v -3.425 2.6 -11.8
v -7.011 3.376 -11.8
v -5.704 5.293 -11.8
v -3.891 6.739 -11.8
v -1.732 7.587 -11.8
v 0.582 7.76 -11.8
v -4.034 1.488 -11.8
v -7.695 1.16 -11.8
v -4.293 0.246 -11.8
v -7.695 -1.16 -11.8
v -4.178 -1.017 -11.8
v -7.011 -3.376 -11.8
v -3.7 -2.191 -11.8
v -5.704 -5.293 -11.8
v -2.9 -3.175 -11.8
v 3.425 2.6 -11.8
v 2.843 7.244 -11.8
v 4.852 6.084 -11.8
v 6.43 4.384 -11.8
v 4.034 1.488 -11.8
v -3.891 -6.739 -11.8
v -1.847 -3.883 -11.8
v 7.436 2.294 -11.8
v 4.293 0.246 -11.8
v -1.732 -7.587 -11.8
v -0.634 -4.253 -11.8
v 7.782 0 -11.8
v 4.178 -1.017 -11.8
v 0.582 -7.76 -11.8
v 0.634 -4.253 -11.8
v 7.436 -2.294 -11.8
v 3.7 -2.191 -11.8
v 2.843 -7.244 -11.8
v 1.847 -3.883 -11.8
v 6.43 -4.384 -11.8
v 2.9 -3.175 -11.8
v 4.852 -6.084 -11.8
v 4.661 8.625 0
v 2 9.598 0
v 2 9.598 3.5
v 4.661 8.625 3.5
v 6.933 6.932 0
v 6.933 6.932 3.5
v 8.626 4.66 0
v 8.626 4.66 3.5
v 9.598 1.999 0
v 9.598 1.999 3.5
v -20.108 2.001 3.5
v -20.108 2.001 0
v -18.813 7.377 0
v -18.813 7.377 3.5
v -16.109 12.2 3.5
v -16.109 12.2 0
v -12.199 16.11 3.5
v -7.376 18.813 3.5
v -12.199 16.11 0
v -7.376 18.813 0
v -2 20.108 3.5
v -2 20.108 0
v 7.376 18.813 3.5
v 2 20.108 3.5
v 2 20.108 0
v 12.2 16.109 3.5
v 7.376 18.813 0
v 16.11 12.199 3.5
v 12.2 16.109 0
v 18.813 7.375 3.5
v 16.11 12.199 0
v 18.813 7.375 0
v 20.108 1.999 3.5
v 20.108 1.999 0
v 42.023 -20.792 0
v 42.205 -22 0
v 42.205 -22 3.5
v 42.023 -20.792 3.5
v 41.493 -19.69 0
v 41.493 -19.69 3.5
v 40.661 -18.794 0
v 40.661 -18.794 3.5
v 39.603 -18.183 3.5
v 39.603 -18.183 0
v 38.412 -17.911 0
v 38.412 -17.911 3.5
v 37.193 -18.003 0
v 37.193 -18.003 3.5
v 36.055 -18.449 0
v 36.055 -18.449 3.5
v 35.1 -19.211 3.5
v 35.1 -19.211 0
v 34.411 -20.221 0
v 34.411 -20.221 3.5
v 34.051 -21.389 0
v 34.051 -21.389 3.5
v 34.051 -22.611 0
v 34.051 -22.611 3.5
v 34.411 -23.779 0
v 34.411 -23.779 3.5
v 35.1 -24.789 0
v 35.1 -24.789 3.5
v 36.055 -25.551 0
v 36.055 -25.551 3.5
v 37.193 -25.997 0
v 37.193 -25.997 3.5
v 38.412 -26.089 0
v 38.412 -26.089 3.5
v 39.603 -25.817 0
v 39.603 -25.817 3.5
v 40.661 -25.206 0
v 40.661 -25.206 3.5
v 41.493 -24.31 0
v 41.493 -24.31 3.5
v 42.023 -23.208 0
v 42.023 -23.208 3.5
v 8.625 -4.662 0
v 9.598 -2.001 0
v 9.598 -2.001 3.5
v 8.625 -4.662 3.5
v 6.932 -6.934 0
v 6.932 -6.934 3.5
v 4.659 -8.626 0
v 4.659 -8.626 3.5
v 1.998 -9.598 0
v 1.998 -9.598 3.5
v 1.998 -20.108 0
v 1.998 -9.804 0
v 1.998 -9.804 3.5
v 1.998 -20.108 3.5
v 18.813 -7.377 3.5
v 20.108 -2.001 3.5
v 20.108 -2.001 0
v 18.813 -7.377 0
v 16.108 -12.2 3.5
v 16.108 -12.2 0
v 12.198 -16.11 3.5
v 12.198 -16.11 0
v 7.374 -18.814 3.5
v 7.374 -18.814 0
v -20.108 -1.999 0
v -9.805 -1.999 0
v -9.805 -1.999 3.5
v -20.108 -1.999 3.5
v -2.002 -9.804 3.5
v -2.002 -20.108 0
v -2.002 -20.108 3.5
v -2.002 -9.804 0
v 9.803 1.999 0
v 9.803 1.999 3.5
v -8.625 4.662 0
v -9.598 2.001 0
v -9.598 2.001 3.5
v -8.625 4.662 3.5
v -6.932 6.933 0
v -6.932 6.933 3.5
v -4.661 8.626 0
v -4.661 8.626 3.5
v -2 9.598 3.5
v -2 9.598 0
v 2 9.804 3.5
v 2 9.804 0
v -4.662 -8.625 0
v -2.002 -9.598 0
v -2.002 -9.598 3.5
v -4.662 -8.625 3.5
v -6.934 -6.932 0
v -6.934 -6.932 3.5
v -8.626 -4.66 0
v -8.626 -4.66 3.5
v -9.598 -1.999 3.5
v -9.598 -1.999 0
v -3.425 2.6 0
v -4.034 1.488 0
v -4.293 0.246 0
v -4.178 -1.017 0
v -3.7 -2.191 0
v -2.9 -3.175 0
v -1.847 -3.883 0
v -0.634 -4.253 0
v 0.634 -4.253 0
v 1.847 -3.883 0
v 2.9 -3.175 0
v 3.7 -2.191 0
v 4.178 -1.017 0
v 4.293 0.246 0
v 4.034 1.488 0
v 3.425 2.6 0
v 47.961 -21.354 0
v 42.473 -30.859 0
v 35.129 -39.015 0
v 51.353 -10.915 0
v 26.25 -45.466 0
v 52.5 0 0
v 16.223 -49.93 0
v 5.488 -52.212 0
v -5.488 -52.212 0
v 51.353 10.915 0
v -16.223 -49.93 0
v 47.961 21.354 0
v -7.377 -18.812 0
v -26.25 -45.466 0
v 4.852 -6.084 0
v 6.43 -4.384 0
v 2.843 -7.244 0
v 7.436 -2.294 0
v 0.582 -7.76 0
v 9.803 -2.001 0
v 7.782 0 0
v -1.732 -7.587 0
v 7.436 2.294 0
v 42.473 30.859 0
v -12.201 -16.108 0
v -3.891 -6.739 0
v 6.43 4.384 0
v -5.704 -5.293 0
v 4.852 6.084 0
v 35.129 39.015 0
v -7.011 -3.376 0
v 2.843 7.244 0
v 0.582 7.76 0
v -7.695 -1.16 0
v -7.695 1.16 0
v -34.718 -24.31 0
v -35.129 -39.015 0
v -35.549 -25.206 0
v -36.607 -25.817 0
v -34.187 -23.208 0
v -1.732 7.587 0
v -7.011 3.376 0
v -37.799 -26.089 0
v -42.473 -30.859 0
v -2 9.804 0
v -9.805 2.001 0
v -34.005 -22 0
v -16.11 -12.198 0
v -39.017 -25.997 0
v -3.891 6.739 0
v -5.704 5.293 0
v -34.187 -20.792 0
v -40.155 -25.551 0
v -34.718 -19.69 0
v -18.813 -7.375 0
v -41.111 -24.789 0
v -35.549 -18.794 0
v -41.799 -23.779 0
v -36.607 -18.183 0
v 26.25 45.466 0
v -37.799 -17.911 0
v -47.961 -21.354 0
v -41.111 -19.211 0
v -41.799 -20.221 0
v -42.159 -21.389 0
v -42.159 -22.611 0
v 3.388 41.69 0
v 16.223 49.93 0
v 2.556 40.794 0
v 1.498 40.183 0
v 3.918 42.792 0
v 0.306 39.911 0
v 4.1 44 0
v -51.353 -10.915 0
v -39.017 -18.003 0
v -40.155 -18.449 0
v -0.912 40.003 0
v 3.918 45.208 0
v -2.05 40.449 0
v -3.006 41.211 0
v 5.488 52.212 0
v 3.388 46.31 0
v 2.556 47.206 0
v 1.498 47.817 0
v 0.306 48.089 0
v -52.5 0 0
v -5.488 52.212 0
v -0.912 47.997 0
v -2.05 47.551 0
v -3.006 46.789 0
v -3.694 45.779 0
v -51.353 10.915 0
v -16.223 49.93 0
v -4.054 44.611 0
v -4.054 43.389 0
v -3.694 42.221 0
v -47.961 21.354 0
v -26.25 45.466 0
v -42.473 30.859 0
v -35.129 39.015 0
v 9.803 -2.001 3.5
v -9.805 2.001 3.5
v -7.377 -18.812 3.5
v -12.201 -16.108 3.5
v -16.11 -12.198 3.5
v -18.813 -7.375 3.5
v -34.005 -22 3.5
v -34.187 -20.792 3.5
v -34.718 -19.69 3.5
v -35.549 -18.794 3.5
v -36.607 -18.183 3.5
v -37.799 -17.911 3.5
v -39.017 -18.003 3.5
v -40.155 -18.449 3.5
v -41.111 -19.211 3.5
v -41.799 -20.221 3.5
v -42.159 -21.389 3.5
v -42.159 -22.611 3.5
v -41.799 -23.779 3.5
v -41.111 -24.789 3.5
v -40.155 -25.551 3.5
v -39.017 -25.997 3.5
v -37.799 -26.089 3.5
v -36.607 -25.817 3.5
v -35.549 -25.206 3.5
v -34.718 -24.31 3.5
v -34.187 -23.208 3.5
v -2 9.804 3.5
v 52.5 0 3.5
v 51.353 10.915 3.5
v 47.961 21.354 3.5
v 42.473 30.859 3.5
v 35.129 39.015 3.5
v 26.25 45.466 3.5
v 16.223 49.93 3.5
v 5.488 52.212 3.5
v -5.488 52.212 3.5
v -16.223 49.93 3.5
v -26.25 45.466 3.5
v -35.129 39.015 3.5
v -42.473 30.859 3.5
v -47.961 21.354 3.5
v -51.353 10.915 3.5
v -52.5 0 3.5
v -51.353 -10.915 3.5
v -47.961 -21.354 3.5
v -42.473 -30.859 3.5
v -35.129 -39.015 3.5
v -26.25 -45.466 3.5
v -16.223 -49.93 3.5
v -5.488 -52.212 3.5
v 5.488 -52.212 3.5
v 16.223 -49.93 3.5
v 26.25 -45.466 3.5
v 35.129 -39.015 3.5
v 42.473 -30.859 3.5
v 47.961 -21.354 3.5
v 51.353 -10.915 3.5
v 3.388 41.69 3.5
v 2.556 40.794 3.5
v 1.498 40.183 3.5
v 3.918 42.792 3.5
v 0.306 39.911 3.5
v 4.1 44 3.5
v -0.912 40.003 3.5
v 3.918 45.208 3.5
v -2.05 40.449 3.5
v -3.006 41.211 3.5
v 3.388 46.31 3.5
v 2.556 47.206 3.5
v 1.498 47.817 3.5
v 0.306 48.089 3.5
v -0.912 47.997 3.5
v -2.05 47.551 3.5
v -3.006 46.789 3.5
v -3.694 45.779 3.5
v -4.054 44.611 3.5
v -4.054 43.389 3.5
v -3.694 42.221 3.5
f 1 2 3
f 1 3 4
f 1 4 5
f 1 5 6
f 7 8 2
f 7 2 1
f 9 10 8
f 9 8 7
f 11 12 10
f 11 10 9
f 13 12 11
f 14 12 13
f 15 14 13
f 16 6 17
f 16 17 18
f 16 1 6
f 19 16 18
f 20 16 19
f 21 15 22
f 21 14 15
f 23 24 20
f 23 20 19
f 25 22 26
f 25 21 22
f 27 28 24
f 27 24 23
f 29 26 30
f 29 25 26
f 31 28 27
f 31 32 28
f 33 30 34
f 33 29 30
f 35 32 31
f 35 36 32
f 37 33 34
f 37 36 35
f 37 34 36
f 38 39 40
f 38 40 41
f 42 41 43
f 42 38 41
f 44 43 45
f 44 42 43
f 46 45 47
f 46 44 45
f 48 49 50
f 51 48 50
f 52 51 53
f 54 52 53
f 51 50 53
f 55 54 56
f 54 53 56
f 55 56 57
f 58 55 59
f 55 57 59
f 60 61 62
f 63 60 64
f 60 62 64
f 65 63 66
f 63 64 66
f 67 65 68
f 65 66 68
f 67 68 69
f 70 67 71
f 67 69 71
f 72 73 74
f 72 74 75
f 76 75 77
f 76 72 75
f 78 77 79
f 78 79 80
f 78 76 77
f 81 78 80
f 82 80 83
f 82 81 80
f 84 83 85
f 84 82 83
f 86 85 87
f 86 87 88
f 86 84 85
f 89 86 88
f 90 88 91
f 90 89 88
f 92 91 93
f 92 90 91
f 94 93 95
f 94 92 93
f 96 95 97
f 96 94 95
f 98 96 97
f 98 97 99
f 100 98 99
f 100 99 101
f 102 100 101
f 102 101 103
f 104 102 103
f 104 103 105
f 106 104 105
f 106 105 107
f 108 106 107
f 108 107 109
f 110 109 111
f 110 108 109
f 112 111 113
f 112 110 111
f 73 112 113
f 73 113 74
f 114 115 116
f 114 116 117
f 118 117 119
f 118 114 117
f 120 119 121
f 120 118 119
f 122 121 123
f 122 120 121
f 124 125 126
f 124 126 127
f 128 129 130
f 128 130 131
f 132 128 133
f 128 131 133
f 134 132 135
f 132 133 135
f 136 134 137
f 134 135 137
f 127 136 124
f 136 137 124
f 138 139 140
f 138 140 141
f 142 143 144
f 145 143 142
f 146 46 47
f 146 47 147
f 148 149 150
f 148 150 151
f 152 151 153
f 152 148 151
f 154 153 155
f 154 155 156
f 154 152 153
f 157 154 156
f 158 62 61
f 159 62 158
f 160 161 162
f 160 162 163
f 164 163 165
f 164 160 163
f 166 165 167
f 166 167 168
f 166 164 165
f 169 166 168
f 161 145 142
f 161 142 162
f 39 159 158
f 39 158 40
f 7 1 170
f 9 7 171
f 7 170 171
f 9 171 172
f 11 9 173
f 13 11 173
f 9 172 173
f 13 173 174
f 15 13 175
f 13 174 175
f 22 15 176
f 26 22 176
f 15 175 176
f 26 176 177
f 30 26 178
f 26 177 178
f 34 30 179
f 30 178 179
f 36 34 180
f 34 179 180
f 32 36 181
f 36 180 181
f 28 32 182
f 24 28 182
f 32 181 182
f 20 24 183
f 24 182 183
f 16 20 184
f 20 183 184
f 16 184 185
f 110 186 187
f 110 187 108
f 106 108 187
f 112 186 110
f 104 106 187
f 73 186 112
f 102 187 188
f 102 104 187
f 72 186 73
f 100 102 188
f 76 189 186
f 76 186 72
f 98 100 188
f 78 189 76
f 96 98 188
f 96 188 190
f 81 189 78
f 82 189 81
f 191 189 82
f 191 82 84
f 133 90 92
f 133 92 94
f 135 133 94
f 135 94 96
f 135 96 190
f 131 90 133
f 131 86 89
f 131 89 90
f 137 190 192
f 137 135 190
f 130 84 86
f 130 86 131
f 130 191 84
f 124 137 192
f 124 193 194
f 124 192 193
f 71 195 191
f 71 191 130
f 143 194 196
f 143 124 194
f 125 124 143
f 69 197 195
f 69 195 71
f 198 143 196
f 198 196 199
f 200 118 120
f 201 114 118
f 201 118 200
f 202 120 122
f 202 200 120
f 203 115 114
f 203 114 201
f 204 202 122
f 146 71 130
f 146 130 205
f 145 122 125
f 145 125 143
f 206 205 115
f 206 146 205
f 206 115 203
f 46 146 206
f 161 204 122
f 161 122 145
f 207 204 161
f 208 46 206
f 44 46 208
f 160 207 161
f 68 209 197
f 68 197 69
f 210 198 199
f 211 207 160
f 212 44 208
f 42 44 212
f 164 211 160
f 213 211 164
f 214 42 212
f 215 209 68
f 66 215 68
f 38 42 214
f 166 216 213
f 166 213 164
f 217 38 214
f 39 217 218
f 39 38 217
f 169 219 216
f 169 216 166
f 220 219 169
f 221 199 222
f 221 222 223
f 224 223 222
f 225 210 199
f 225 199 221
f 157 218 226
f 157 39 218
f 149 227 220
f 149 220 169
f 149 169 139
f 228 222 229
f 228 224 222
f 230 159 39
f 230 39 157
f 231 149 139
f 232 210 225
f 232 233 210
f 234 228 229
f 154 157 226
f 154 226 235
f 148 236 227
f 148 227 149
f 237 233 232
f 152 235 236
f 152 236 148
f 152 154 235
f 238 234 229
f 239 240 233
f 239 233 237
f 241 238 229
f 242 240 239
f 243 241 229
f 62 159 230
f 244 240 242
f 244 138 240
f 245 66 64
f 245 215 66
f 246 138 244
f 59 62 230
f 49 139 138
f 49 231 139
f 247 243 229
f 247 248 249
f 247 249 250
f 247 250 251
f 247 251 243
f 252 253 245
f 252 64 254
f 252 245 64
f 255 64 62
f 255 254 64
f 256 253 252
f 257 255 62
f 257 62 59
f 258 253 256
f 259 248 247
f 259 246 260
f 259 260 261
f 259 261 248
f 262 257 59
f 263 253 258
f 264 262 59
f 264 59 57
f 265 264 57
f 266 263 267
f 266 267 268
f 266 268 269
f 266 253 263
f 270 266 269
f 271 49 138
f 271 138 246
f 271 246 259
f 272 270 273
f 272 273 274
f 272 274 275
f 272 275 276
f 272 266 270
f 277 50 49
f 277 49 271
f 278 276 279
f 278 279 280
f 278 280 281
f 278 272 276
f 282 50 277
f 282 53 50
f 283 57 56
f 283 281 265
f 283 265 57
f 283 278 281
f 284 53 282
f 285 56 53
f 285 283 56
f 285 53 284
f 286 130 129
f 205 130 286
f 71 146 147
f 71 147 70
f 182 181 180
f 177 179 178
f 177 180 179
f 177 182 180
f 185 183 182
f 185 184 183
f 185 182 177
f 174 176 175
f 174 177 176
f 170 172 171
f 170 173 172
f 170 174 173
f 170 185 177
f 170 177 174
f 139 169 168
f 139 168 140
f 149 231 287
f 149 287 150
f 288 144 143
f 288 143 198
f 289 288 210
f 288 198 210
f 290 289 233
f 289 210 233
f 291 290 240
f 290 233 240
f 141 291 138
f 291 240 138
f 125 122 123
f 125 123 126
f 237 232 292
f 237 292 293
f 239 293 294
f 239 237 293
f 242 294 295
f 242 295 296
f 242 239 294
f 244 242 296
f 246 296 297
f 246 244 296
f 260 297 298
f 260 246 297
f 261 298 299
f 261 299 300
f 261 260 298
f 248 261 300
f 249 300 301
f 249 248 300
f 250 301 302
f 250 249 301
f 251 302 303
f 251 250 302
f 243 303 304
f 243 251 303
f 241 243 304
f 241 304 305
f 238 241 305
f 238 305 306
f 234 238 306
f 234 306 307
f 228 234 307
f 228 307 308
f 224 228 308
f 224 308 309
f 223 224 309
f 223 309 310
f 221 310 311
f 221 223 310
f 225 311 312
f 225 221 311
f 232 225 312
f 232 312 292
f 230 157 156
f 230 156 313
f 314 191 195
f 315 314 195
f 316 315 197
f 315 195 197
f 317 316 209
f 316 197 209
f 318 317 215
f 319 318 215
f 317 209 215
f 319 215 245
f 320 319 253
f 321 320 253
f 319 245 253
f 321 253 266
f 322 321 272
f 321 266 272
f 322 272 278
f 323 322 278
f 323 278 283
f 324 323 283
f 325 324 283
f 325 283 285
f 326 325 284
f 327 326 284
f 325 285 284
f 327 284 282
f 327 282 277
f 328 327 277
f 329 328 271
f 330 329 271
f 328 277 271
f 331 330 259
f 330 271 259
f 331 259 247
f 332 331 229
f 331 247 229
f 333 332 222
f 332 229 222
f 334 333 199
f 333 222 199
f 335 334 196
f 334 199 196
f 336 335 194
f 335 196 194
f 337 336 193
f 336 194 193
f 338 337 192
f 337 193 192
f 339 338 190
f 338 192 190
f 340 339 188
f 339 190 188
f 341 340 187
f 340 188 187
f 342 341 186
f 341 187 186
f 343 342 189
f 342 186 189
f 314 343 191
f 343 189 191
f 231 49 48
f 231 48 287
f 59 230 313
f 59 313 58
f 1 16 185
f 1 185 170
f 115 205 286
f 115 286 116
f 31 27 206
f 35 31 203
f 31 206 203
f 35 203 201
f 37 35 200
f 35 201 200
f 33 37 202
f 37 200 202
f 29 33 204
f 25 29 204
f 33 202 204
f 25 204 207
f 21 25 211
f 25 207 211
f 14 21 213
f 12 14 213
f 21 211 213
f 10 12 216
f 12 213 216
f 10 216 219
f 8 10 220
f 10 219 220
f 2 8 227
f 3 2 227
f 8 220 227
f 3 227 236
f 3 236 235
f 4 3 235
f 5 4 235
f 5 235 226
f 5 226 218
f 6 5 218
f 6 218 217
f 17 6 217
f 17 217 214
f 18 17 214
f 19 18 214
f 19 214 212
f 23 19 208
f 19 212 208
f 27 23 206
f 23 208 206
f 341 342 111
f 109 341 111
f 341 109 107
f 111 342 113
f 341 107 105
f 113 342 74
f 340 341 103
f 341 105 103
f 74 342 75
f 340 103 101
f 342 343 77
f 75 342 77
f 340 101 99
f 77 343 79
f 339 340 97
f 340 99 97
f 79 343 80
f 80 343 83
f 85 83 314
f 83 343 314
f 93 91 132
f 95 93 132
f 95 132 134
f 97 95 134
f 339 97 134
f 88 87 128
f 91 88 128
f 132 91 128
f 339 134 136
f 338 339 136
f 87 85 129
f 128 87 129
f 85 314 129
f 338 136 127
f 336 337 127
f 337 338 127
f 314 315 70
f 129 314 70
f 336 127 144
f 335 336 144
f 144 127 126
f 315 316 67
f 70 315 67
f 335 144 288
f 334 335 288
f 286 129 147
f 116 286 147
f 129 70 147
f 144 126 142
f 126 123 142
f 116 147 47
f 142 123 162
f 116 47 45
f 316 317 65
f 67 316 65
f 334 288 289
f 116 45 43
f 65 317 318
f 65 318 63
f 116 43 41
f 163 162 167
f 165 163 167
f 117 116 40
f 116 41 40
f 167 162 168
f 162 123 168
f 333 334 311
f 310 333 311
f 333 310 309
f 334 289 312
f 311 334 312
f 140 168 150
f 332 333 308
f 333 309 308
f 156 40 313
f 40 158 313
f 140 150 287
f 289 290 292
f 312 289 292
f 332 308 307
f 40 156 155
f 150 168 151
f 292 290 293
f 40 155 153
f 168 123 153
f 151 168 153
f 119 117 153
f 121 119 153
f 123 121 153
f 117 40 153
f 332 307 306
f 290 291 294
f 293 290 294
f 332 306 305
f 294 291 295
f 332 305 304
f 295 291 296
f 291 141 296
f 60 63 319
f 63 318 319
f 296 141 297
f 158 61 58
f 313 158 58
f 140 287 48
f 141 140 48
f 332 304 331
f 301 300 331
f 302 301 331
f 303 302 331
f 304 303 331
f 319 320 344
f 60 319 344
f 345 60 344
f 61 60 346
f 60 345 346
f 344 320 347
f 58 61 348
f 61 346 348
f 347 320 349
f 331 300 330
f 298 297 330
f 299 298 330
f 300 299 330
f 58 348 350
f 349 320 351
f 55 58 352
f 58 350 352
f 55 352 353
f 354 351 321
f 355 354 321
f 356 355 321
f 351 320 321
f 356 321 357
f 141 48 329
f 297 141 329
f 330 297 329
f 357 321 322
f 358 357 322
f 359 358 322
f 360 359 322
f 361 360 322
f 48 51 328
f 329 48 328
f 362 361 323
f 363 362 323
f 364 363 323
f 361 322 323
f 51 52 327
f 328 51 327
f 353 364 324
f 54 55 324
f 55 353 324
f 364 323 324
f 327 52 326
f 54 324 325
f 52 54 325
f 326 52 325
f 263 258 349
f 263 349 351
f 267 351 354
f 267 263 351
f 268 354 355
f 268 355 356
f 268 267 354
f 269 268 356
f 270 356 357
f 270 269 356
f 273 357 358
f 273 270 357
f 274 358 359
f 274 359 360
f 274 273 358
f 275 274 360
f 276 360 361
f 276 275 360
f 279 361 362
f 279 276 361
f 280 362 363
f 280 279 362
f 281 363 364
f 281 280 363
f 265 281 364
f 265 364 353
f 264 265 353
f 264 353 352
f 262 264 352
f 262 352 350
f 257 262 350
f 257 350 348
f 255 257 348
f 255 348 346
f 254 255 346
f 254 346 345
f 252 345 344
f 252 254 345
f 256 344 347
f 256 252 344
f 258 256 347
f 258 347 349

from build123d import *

# Parameters (mm, degrees)
SKETCH2_R           = 52.5
SKETCH2_R_2         = 4.1
BOSS_EXTRUDE1_DEPTH = 3.5
SKETCH3_R           = 20.207259422
CUT_EXTRUDE1_DEPTH  = 11.8
BOSS_EXTRUDE2_DEPTH = 3.5
SKETCH5_R           = 7.781762147
BOSS_EXTRUDE3_DEPTH = 11.8


with BuildPart() as part:
    # Sketch2 → Boss-Extrude1 (new body)
    with BuildSketch(Plane.XY):
        Circle(SKETCH2_R)
        with Locations((0, 44)):
            Circle(SKETCH2_R_2, mode=Mode.SUBTRACT)
        with Locations((38.105117767, -22)):
            Circle(SKETCH2_R_2, mode=Mode.SUBTRACT)
        with Locations((-38.105117767, -22)):
            Circle(SKETCH2_R_2, mode=Mode.SUBTRACT)
        Polygon((-17.5, 10.103629711), (0, 20.207259422), (17.5, 10.103629711), (17.5, -10.103629711), (0, -20.207259422), (-17.5, -10.103629711), align=None, mode=Mode.SUBTRACT)
    extrude(amount=BOSS_EXTRUDE1_DEPTH)

    # Sketch3 → Cut-Extrude1 (cut)
    with BuildSketch(Plane(origin=(0, 0, 0), x_dir=(-1, 0, 0), z_dir=(0, 0, -1))):
        Circle(SKETCH3_R)
    extrude(amount=-CUT_EXTRUDE1_DEPTH, mode=Mode.SUBTRACT)

    # Sketch4 → Boss-Extrude2 (add)
    with BuildSketch(Plane(origin=(0, 0, 0), x_dir=(-1, 0, 0), z_dir=(0, 0, -1))):
        with BuildLine():
            Line((2, 9.80418615), (2, 34.404657721))
            Line((2, 34.404657721), (-2, 34.404657721))
            Line((-2, 34.404657721), (-2, 9.80418615))
            Line((-2, 9.80418615), (-1.999978972, 9.598028452))
            ThreePointArc((-1.999978972, 9.598028452), (-6.932952502, 6.932260502), (-9.598228039, 1.999020905))
            Line((-9.598228039, 1.999020905), (-9.80318615, 1.999))
            Line((-9.80318615, 1.999), (-34.403657721, 1.999))
            Line((-34.403657721, 1.999), (-34.403657721, -2.001))
            Line((-34.403657721, -2.001), (-9.80318615, -2.001))
            Line((-9.80318615, -2.001), (-9.597820007, -2.000979053))
            ThreePointArc((-9.597820007, -2.000979053), (-6.931538141, -6.933674715), (-1.998020986, -9.598436237))
            Line((-1.998020986, -9.598436237), (-1.998, -9.80418615))
            Line((-1.998, -9.80418615), (-1.998, -34.404657721))
            Line((-1.998, -34.404657721), (2.002, -34.404657721))
            Line((2.002, -34.404657721), (2.002, -9.80418615))
            Line((2.002, -9.80418615), (2.00197893, -9.597611496))
            ThreePointArc((2.00197893, -9.597611496), (6.93367465, -6.931538207), (9.598227996, -1.999021109))
            Line((9.598227996, -1.999021109), (9.80518615, -1.999))
            Line((9.80518615, -1.999), (34.405657721, -1.999))
            Line((34.405657721, -1.999), (34.405657721, 2.001))
            Line((34.405657721, 2.001), (9.80518615, 2.001))
            Line((9.80518615, 2.001), (9.59782005, 2.000978849))
            ThreePointArc((9.59782005, 2.000978849), (6.932260583, 6.93295242), (2.000021028, 9.598019689))
            Line((2.000021028, 9.598019689), (2, 9.80418615))
        make_face()
    extrude(amount=-BOSS_EXTRUDE2_DEPTH)

    # Sketch5 → Boss-Extrude3 (add)
    with BuildSketch(Plane(origin=(0, 0, 0), x_dir=(-1, 0, 0), z_dir=(0, 0, -1))):
        with Locations(Location((0, 0, 0), (0, 0, 180))):
            Circle(SKETCH5_R)
        with BuildLine():
            Line((-3.424908758, 2.6), (3.424908758, 2.6))
            ThreePointArc((3.424908758, 2.6), (0, -4.3), (-3.424908758, 2.6))
        make_face(mode=Mode.SUBTRACT)
    extrude(amount=BOSS_EXTRUDE3_DEPTH)


solid = part.part
